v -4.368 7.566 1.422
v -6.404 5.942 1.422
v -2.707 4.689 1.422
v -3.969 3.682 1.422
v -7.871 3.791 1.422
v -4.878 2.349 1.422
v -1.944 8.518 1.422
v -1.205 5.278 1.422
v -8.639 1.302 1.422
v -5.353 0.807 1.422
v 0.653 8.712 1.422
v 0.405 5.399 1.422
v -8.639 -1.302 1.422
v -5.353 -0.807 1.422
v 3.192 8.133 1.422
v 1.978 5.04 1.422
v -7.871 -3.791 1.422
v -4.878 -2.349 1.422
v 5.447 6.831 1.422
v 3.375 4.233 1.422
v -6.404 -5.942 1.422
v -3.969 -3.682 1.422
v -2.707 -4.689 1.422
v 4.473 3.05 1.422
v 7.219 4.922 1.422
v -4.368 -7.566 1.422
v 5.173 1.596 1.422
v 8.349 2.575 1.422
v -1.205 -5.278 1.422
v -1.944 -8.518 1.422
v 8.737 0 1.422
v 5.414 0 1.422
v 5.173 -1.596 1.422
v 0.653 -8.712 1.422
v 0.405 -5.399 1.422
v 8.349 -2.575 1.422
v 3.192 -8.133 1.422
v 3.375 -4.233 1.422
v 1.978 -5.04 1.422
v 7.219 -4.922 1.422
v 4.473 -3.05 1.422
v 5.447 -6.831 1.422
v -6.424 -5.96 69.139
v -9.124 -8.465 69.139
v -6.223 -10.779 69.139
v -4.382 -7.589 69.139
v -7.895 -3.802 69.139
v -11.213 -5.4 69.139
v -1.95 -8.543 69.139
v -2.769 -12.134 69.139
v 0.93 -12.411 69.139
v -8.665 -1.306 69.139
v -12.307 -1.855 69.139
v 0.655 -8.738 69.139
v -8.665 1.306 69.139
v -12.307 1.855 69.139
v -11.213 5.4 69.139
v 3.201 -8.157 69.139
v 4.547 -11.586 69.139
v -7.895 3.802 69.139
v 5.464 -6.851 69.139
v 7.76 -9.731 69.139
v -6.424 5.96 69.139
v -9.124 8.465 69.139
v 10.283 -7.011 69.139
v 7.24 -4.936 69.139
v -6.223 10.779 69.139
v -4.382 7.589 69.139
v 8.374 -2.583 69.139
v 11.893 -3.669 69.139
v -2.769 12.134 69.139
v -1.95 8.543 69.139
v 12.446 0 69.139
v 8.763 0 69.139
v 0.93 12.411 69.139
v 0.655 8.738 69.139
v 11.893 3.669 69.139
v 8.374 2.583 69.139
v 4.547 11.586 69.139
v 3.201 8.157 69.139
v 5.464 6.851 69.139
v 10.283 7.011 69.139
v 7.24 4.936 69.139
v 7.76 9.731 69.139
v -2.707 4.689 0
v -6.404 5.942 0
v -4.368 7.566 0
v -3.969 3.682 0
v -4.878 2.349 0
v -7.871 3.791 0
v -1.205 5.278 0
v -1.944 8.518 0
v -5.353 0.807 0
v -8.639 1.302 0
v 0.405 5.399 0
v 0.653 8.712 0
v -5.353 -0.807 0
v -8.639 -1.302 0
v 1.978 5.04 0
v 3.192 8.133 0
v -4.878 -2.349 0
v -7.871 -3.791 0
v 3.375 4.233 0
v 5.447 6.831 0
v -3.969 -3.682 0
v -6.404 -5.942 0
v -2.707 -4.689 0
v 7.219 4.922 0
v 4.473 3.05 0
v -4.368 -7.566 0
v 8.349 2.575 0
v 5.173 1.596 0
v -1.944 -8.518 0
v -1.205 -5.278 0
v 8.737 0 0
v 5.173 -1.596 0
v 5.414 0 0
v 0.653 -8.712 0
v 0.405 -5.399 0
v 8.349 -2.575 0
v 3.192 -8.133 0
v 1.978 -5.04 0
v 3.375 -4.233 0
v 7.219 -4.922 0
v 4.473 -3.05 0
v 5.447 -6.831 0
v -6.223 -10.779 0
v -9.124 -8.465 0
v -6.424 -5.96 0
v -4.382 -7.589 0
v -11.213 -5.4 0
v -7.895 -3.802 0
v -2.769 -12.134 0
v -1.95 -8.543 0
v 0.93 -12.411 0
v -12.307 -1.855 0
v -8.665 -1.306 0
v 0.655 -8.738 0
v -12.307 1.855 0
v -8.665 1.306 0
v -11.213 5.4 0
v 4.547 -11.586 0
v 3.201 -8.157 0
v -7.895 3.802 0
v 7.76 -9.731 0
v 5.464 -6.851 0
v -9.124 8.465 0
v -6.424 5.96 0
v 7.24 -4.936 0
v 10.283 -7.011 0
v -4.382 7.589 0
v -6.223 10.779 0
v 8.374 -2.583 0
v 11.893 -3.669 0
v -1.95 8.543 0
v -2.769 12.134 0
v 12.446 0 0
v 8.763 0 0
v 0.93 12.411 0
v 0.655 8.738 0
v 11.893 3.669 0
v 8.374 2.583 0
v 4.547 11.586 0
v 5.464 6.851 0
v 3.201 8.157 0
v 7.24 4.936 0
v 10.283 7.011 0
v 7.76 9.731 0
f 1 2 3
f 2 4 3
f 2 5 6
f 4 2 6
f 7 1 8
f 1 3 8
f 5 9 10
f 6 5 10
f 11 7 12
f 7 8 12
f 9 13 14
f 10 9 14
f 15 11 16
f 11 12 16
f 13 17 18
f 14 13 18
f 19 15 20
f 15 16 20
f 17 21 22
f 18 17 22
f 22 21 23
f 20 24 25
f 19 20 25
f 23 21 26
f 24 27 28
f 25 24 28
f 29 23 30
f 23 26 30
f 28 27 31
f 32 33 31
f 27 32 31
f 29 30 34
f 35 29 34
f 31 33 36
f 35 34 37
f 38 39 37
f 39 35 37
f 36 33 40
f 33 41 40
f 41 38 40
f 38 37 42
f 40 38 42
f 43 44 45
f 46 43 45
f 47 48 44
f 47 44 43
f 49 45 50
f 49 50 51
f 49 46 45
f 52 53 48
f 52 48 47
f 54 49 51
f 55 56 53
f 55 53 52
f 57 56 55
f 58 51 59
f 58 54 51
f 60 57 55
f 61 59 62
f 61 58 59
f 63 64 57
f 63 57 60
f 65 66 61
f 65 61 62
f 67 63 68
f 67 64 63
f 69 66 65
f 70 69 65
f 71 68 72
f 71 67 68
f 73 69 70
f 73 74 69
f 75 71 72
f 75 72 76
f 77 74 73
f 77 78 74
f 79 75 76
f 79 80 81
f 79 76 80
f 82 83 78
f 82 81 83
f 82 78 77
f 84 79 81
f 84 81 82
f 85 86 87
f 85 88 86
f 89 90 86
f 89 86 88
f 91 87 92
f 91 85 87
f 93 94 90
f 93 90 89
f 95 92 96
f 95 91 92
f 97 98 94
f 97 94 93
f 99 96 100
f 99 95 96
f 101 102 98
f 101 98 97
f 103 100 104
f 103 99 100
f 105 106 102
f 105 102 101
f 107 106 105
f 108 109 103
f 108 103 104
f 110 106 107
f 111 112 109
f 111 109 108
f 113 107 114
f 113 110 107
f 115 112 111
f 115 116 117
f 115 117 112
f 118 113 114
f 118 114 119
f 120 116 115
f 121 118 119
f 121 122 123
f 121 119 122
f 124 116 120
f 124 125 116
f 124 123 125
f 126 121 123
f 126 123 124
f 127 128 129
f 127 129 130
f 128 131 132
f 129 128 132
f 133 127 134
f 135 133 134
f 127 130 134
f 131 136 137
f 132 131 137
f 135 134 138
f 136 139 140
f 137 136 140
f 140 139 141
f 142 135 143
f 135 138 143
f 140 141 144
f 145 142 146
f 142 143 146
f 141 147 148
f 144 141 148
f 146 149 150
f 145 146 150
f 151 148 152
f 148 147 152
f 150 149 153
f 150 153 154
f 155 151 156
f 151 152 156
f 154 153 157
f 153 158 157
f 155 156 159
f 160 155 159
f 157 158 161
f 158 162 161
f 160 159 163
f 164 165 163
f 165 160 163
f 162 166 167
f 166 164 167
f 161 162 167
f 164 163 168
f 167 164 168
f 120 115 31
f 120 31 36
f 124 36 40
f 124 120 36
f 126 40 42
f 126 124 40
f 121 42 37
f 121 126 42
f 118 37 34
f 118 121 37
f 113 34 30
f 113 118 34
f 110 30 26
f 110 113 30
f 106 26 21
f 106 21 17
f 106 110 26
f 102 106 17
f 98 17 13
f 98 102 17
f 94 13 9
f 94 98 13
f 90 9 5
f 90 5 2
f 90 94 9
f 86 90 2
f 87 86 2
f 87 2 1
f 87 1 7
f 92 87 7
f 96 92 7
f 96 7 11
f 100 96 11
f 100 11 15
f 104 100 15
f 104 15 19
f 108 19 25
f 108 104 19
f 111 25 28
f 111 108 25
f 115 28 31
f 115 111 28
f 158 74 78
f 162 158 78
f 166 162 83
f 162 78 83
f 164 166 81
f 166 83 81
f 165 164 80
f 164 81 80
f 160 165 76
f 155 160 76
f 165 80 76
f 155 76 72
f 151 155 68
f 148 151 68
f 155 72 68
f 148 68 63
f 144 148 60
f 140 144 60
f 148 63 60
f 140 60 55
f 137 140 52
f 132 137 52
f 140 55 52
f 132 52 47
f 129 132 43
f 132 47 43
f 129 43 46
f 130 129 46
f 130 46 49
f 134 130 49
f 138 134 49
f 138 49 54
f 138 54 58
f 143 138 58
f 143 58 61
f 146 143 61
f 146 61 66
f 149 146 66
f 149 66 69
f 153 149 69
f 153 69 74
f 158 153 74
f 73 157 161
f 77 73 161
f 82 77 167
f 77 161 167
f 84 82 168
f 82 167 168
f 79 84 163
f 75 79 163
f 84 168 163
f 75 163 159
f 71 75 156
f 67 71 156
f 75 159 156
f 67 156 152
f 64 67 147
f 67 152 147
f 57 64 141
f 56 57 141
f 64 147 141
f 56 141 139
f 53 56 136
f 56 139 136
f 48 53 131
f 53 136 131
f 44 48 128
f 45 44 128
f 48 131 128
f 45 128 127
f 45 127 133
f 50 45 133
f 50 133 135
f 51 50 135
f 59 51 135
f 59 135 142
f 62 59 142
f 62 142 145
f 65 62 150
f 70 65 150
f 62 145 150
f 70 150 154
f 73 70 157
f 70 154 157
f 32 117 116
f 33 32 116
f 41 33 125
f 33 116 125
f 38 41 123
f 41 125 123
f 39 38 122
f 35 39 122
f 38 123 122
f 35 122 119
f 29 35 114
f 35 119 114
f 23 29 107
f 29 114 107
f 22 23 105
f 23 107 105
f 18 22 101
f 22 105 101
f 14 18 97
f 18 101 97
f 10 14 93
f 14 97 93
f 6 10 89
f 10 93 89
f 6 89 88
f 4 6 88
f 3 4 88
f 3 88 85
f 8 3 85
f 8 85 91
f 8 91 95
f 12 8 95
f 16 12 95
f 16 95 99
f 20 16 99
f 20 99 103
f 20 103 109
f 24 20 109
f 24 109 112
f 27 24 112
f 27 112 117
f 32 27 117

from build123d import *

# Parameters (mm, degrees)
F0_R      = 12.446
F1_DEPTH  = 69.1388
F3_R      = 8.763
F4_DEPTH  = 69.1398
F5_R      = 8.736653
F6_DEPTH  = 1.4224
F7_R      = 5.413871
F8_DEPTH  = 25.4
F8_FACE_R = 5.413871
F9_DEPTH  = 94.5398


with BuildPart() as f1:
    # F0 (on Top) → F1 (new body)
    with BuildSketch(Plane.XY):
        Circle(F0_R)
    extrude(amount=F1_DEPTH)

    # F3 (on face) → F4 (cut, through all)
    with BuildSketch(Plane.XY.offset(69.1388)):
        Circle(F3_R)
    extrude(amount=-F4_DEPTH, mode=Mode.SUBTRACT)


with BuildPart() as f6:
    # F5 (on face) → F6 (new body)
    with BuildSketch(Plane(origin=(0, 0, 0), x_dir=(1, 0, 0), z_dir=(0, 0, -1))):
        Circle(F5_R)
    extrude(amount=-F6_DEPTH)

    # F7 (on face) → F8 (join)
    with BuildSketch(Plane(origin=(0, 0, 0), x_dir=(1, 0, 0), z_dir=(0, 0, -1))):
        Circle(F7_R)
    extrude(amount=F8_DEPTH)

    # F8_face (on face) → F9 (cut, through all)
    with BuildSketch(Plane(origin=(0, 0, -25.4), x_dir=(1, 0, 0), z_dir=(0, 0, -1))):
        Circle(F8_FACE_R)
    extrude(amount=-F9_DEPTH, mode=Mode.SUBTRACT)


solid = Compound([f1.part, f6.part])
